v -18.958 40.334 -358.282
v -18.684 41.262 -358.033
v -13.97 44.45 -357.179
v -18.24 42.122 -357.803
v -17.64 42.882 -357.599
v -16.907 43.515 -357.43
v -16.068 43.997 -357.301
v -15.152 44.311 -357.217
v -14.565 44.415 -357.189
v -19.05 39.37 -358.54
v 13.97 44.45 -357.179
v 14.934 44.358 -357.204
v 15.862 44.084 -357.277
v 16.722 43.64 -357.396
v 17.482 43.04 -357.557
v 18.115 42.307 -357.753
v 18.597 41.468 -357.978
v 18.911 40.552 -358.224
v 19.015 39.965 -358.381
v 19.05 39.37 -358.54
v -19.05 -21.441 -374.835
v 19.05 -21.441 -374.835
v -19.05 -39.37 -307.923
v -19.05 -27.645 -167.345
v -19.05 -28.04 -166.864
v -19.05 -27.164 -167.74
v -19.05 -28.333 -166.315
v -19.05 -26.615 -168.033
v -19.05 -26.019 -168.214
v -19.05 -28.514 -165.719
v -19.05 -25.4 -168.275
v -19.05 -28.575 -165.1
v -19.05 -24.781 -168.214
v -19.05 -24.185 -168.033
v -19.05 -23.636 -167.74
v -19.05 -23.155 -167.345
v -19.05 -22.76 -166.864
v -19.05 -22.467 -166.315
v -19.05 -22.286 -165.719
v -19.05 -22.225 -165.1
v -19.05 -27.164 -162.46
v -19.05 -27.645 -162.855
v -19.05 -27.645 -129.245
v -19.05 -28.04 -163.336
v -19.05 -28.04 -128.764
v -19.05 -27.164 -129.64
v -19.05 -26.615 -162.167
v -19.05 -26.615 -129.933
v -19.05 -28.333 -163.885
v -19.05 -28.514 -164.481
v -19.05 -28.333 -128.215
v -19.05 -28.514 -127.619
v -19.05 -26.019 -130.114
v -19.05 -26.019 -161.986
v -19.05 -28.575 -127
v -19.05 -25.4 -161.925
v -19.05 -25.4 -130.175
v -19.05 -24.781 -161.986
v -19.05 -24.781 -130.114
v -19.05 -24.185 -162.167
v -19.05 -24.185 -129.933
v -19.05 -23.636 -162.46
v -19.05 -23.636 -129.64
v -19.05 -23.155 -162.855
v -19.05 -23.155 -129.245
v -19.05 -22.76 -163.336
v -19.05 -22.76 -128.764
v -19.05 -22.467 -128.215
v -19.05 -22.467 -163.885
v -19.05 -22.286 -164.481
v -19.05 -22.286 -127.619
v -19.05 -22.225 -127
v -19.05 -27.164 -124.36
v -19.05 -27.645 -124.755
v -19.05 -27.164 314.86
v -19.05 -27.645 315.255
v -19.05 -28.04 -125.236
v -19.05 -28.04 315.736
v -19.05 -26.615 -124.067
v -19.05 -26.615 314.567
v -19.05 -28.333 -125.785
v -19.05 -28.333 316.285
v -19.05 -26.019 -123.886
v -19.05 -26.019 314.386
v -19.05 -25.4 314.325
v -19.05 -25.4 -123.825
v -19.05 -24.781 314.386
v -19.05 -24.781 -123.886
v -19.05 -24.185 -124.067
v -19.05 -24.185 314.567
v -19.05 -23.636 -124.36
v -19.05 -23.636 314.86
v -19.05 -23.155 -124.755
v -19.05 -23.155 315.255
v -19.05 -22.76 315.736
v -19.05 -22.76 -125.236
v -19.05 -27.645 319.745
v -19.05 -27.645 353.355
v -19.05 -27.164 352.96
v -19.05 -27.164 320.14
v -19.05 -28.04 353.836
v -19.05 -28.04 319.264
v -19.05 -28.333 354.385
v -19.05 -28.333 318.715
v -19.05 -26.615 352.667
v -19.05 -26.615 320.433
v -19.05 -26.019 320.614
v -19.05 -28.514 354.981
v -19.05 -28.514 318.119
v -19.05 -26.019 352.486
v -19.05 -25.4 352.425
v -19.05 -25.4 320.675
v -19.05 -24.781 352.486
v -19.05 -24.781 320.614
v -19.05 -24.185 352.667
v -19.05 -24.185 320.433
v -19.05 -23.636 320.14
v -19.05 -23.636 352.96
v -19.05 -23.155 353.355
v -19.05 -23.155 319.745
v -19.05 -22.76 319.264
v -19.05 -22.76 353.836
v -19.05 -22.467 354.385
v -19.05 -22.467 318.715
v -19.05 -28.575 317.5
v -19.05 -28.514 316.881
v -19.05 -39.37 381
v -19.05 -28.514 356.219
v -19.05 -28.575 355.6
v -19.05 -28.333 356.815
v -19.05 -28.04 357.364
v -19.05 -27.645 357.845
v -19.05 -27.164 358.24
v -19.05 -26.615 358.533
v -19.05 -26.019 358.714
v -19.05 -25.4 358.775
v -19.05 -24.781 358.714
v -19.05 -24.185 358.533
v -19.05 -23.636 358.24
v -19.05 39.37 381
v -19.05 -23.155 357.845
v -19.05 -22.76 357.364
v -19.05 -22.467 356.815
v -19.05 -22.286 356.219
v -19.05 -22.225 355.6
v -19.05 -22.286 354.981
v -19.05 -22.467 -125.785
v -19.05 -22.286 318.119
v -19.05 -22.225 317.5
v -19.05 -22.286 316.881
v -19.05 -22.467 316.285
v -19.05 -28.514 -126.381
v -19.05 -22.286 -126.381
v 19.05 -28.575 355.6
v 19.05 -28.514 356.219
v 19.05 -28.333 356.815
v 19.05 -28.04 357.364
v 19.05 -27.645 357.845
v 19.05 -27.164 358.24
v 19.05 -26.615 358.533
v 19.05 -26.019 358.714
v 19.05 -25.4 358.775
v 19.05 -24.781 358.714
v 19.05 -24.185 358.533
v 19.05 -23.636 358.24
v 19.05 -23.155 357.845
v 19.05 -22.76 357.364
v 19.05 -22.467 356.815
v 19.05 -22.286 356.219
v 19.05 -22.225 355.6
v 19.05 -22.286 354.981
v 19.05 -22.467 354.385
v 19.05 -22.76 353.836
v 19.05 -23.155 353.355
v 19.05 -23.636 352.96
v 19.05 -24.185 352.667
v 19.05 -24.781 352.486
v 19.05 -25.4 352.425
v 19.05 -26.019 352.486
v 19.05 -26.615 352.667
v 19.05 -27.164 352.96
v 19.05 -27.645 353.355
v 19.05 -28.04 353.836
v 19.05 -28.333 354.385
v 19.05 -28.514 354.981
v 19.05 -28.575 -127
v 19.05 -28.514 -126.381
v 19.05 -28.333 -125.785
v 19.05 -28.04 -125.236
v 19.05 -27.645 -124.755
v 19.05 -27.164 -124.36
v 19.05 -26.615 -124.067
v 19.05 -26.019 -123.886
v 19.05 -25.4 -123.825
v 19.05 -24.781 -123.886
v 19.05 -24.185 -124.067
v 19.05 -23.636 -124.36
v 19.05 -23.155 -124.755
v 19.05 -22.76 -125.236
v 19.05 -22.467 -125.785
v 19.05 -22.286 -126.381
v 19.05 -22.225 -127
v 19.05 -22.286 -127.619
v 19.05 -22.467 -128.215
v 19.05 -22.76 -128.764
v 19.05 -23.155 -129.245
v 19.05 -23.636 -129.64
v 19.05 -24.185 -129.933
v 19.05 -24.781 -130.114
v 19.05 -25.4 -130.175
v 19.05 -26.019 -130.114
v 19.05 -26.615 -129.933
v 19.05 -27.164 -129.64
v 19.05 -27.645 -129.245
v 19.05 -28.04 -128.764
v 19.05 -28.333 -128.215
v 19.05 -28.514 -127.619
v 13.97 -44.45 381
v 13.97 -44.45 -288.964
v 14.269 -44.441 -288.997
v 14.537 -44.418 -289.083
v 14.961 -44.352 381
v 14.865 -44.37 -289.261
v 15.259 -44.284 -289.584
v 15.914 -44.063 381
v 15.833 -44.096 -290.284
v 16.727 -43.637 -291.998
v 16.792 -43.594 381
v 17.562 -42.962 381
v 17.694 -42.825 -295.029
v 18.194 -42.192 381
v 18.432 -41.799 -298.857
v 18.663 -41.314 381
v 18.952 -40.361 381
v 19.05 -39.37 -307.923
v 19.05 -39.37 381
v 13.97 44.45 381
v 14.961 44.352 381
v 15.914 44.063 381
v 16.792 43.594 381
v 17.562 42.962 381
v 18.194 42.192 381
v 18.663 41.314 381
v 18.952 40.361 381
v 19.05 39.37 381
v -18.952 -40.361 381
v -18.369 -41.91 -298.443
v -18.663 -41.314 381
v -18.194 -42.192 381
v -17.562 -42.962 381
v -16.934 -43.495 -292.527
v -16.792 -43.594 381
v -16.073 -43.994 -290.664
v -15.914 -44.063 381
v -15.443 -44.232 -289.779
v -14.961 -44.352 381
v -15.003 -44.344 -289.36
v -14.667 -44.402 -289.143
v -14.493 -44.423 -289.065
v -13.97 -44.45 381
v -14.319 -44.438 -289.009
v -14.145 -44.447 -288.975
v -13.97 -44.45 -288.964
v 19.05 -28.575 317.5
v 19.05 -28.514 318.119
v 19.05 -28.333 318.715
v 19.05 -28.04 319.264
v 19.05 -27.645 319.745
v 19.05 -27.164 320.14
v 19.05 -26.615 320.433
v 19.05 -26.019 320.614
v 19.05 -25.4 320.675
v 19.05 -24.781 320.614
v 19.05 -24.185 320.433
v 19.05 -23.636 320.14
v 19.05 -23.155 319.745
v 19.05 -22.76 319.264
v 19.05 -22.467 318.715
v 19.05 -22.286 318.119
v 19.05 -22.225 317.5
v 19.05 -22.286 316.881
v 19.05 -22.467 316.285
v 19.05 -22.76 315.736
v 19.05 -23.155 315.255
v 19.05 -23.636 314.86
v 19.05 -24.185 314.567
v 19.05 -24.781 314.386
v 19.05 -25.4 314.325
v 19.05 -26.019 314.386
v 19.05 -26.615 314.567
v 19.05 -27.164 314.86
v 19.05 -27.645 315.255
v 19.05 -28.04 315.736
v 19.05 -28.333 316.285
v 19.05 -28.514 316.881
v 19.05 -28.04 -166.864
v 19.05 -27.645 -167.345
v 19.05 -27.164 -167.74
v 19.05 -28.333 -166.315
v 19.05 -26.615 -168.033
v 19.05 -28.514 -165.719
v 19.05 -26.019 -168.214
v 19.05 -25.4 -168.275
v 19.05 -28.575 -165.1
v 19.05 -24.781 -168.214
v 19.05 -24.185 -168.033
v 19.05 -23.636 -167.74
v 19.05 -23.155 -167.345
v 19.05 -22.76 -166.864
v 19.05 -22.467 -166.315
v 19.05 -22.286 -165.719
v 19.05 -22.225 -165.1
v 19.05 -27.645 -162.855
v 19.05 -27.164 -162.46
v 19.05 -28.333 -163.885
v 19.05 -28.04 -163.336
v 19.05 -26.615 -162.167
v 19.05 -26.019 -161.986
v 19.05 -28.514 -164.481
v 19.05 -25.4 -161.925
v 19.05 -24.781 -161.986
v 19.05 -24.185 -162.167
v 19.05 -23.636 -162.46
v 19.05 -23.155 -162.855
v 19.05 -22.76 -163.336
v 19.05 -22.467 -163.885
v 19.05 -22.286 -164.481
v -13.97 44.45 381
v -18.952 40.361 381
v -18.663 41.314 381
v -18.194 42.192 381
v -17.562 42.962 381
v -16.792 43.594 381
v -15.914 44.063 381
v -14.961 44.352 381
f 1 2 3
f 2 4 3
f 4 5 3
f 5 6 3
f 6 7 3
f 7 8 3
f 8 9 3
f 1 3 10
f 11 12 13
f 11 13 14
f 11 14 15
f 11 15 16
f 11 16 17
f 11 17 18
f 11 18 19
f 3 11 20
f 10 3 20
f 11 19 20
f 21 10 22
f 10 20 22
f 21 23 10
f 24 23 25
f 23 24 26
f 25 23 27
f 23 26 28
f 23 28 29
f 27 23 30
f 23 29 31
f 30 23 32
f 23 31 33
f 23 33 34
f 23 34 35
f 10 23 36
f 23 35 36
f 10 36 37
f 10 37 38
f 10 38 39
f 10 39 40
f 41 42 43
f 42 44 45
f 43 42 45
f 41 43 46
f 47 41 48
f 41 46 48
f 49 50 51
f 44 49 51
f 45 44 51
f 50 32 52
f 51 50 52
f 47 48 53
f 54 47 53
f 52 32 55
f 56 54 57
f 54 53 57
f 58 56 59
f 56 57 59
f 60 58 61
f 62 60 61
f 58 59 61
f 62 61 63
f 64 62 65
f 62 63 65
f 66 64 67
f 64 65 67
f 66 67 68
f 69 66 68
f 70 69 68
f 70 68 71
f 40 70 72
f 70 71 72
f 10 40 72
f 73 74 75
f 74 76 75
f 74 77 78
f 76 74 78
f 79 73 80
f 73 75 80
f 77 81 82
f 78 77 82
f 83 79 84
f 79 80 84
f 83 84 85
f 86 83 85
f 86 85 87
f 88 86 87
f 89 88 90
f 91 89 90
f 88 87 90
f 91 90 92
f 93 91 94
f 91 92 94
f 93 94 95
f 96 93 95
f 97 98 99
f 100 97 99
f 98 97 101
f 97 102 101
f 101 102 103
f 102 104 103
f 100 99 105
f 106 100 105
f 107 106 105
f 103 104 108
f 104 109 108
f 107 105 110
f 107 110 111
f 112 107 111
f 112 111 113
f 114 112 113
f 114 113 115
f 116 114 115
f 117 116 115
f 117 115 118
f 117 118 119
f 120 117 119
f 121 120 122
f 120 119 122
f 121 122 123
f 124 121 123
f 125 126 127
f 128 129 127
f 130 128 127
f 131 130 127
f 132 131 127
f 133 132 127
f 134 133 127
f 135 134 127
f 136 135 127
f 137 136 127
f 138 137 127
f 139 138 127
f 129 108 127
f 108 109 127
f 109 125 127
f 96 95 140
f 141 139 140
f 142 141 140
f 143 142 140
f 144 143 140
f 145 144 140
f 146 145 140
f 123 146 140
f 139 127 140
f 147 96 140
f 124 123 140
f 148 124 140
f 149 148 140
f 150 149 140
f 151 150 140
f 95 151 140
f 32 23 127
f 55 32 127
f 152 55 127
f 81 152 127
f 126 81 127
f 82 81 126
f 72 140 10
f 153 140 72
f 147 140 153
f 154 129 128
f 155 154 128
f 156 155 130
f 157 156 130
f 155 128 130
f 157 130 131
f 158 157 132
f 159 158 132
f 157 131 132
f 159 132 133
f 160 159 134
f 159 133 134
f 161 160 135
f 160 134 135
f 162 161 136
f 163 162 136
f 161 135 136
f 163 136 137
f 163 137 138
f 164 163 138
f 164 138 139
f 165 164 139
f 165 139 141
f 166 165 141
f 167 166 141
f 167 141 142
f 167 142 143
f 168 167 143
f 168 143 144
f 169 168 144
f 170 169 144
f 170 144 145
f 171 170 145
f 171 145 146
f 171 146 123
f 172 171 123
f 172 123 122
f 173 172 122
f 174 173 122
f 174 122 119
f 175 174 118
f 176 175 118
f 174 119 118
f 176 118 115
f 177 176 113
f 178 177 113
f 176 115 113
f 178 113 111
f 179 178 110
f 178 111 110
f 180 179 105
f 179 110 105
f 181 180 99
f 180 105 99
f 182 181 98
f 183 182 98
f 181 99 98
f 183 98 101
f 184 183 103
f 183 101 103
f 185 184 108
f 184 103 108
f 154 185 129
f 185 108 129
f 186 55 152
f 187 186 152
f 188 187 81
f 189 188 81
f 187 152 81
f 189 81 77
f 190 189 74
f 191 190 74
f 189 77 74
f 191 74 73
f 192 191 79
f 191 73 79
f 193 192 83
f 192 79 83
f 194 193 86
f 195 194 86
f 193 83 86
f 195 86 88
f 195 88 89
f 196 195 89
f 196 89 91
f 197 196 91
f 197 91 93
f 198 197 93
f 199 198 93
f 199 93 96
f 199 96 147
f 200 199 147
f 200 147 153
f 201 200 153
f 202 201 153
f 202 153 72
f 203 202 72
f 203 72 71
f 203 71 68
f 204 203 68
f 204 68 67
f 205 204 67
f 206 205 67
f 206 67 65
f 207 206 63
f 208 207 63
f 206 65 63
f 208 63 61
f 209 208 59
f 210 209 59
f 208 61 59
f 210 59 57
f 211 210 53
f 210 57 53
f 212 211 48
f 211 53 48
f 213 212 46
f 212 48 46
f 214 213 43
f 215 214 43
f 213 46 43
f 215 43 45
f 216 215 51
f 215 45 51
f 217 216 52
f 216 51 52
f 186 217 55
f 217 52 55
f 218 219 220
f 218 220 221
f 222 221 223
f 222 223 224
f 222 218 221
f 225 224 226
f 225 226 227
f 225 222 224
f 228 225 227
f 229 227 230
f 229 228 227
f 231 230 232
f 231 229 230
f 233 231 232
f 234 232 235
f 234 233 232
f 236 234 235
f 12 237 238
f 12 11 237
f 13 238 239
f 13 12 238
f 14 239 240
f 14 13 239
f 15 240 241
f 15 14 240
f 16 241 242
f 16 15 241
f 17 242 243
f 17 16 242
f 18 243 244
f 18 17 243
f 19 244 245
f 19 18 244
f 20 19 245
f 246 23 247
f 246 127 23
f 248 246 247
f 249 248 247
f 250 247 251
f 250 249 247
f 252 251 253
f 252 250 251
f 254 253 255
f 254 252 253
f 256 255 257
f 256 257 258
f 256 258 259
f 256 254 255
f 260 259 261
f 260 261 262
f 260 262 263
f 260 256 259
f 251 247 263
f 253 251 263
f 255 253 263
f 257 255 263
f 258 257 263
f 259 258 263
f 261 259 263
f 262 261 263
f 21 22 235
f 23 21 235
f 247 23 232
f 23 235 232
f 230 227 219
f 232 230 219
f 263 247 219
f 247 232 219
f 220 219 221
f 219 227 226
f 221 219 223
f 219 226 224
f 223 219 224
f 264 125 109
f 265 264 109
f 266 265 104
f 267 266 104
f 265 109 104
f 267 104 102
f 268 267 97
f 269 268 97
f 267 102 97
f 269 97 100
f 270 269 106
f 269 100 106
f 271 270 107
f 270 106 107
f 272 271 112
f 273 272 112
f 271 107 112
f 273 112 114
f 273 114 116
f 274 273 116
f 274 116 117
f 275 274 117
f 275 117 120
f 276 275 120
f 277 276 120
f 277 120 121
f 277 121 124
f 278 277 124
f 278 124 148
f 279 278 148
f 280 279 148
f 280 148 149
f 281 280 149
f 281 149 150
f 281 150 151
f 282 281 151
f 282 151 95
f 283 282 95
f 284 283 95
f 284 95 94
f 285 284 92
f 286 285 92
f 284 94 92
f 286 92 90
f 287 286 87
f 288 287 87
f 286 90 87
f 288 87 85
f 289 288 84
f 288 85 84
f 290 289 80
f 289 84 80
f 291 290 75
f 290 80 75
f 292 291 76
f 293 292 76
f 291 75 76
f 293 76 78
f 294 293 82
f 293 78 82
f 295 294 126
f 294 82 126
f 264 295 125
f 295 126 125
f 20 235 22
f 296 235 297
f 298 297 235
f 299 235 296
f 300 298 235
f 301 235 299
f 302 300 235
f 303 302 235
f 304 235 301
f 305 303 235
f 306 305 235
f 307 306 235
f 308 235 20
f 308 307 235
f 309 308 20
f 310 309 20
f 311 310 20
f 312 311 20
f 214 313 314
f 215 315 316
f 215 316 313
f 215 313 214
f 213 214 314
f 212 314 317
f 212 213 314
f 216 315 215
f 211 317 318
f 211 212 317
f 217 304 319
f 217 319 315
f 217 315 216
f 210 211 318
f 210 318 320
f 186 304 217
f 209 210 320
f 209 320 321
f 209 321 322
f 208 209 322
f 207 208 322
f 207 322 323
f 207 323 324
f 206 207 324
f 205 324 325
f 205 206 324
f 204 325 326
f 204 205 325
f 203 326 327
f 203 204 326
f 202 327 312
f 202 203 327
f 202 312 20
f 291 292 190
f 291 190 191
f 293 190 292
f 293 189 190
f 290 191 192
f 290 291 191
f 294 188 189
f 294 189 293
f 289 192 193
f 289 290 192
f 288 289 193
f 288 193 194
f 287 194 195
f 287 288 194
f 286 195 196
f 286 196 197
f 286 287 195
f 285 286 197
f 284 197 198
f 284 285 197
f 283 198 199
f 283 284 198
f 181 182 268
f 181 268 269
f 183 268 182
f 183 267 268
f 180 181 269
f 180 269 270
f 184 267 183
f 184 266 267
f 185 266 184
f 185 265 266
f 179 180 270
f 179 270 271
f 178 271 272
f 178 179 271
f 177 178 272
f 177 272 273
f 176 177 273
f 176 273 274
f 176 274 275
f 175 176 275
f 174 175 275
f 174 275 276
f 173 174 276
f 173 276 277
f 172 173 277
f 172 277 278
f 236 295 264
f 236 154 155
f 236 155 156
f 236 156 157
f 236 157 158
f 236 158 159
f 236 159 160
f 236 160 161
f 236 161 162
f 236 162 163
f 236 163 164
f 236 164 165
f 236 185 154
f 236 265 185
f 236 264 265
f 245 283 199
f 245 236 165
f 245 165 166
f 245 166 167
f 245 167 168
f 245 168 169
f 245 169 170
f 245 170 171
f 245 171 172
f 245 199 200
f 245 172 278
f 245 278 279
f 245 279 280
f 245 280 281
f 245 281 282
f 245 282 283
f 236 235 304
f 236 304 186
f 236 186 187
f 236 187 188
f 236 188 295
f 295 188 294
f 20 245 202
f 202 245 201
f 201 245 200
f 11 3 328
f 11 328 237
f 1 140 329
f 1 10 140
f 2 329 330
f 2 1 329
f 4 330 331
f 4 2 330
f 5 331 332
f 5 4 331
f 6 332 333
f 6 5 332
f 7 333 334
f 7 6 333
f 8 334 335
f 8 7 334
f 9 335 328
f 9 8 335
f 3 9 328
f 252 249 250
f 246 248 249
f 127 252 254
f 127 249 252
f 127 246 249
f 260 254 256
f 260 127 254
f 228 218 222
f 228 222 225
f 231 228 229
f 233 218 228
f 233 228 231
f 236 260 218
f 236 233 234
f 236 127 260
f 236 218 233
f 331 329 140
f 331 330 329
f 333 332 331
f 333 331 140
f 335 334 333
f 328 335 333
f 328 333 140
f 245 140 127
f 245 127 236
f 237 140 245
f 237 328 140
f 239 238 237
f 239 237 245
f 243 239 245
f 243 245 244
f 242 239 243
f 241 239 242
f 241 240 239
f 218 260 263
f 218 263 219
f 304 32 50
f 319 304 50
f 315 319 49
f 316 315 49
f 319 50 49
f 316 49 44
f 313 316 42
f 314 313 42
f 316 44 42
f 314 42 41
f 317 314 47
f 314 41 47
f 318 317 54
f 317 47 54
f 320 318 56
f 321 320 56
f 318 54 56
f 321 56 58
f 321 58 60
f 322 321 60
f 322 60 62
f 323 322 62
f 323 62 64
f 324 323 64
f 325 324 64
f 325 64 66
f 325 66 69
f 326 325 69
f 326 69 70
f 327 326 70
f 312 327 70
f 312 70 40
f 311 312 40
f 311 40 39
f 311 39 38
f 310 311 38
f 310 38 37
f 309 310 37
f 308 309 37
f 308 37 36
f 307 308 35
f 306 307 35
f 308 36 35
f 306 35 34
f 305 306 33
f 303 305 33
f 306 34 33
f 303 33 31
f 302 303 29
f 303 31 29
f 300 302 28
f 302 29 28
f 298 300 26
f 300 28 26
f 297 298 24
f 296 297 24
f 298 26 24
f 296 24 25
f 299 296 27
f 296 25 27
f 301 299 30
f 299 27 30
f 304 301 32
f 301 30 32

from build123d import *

# Parameters (mm, degrees)
F0_W     = 38.1
F0_H     = 88.9
F1_DEPTH = 381
F3_DEPTH = 38.101
F4_R     = 5.08
F6_D     = 6.35


# Not quite as in the source:
# - a feature names something its author has since deleted; it is built from what else it names


with BuildPart() as f1:
    # F0 (on Top) → F1 (new body, symmetric)
    with BuildSketch(Plane.XY):
        Rectangle(F0_W, F0_H)
    extrude(amount=F1_DEPTH, both=True)

    # F2 (on face) → F3 (cut, through all)
    with BuildSketch(Plane.YZ.offset(19.05)):
        Polygon((-21.4409868904, -374.8347535186), (-44.45, -381), (44.45, -381), (44.45, -357.1793167929), align=None)
        Polygon((-44.45, -288.9639475615), (-44.45, -381), (-21.4409868904, -374.8347535186), align=None)
    extrude(amount=-F3_DEPTH, mode=Mode.SUBTRACT)

    # F4
    f4_edges = [f1.edges().sort_by_distance(p)[0] for p in [
        (19.05, -44.45, 46.018026),
        (-19.05, -44.45, 46.018026),
        (19.05, 44.45, 11.910342),
        (-19.05, 44.45, 11.910342),
    ]]
    fillet(f4_edges, radius=F4_R)

    # F6 (through all)
    with Locations(Plane.YZ.offset(19.05)):
        with Locations((-25.4, 355.6), (-25.4, 317.5), (-25.4, -127), (-25.4, -165.1)):
            Hole(F6_D / 2)


solid = f1.part
